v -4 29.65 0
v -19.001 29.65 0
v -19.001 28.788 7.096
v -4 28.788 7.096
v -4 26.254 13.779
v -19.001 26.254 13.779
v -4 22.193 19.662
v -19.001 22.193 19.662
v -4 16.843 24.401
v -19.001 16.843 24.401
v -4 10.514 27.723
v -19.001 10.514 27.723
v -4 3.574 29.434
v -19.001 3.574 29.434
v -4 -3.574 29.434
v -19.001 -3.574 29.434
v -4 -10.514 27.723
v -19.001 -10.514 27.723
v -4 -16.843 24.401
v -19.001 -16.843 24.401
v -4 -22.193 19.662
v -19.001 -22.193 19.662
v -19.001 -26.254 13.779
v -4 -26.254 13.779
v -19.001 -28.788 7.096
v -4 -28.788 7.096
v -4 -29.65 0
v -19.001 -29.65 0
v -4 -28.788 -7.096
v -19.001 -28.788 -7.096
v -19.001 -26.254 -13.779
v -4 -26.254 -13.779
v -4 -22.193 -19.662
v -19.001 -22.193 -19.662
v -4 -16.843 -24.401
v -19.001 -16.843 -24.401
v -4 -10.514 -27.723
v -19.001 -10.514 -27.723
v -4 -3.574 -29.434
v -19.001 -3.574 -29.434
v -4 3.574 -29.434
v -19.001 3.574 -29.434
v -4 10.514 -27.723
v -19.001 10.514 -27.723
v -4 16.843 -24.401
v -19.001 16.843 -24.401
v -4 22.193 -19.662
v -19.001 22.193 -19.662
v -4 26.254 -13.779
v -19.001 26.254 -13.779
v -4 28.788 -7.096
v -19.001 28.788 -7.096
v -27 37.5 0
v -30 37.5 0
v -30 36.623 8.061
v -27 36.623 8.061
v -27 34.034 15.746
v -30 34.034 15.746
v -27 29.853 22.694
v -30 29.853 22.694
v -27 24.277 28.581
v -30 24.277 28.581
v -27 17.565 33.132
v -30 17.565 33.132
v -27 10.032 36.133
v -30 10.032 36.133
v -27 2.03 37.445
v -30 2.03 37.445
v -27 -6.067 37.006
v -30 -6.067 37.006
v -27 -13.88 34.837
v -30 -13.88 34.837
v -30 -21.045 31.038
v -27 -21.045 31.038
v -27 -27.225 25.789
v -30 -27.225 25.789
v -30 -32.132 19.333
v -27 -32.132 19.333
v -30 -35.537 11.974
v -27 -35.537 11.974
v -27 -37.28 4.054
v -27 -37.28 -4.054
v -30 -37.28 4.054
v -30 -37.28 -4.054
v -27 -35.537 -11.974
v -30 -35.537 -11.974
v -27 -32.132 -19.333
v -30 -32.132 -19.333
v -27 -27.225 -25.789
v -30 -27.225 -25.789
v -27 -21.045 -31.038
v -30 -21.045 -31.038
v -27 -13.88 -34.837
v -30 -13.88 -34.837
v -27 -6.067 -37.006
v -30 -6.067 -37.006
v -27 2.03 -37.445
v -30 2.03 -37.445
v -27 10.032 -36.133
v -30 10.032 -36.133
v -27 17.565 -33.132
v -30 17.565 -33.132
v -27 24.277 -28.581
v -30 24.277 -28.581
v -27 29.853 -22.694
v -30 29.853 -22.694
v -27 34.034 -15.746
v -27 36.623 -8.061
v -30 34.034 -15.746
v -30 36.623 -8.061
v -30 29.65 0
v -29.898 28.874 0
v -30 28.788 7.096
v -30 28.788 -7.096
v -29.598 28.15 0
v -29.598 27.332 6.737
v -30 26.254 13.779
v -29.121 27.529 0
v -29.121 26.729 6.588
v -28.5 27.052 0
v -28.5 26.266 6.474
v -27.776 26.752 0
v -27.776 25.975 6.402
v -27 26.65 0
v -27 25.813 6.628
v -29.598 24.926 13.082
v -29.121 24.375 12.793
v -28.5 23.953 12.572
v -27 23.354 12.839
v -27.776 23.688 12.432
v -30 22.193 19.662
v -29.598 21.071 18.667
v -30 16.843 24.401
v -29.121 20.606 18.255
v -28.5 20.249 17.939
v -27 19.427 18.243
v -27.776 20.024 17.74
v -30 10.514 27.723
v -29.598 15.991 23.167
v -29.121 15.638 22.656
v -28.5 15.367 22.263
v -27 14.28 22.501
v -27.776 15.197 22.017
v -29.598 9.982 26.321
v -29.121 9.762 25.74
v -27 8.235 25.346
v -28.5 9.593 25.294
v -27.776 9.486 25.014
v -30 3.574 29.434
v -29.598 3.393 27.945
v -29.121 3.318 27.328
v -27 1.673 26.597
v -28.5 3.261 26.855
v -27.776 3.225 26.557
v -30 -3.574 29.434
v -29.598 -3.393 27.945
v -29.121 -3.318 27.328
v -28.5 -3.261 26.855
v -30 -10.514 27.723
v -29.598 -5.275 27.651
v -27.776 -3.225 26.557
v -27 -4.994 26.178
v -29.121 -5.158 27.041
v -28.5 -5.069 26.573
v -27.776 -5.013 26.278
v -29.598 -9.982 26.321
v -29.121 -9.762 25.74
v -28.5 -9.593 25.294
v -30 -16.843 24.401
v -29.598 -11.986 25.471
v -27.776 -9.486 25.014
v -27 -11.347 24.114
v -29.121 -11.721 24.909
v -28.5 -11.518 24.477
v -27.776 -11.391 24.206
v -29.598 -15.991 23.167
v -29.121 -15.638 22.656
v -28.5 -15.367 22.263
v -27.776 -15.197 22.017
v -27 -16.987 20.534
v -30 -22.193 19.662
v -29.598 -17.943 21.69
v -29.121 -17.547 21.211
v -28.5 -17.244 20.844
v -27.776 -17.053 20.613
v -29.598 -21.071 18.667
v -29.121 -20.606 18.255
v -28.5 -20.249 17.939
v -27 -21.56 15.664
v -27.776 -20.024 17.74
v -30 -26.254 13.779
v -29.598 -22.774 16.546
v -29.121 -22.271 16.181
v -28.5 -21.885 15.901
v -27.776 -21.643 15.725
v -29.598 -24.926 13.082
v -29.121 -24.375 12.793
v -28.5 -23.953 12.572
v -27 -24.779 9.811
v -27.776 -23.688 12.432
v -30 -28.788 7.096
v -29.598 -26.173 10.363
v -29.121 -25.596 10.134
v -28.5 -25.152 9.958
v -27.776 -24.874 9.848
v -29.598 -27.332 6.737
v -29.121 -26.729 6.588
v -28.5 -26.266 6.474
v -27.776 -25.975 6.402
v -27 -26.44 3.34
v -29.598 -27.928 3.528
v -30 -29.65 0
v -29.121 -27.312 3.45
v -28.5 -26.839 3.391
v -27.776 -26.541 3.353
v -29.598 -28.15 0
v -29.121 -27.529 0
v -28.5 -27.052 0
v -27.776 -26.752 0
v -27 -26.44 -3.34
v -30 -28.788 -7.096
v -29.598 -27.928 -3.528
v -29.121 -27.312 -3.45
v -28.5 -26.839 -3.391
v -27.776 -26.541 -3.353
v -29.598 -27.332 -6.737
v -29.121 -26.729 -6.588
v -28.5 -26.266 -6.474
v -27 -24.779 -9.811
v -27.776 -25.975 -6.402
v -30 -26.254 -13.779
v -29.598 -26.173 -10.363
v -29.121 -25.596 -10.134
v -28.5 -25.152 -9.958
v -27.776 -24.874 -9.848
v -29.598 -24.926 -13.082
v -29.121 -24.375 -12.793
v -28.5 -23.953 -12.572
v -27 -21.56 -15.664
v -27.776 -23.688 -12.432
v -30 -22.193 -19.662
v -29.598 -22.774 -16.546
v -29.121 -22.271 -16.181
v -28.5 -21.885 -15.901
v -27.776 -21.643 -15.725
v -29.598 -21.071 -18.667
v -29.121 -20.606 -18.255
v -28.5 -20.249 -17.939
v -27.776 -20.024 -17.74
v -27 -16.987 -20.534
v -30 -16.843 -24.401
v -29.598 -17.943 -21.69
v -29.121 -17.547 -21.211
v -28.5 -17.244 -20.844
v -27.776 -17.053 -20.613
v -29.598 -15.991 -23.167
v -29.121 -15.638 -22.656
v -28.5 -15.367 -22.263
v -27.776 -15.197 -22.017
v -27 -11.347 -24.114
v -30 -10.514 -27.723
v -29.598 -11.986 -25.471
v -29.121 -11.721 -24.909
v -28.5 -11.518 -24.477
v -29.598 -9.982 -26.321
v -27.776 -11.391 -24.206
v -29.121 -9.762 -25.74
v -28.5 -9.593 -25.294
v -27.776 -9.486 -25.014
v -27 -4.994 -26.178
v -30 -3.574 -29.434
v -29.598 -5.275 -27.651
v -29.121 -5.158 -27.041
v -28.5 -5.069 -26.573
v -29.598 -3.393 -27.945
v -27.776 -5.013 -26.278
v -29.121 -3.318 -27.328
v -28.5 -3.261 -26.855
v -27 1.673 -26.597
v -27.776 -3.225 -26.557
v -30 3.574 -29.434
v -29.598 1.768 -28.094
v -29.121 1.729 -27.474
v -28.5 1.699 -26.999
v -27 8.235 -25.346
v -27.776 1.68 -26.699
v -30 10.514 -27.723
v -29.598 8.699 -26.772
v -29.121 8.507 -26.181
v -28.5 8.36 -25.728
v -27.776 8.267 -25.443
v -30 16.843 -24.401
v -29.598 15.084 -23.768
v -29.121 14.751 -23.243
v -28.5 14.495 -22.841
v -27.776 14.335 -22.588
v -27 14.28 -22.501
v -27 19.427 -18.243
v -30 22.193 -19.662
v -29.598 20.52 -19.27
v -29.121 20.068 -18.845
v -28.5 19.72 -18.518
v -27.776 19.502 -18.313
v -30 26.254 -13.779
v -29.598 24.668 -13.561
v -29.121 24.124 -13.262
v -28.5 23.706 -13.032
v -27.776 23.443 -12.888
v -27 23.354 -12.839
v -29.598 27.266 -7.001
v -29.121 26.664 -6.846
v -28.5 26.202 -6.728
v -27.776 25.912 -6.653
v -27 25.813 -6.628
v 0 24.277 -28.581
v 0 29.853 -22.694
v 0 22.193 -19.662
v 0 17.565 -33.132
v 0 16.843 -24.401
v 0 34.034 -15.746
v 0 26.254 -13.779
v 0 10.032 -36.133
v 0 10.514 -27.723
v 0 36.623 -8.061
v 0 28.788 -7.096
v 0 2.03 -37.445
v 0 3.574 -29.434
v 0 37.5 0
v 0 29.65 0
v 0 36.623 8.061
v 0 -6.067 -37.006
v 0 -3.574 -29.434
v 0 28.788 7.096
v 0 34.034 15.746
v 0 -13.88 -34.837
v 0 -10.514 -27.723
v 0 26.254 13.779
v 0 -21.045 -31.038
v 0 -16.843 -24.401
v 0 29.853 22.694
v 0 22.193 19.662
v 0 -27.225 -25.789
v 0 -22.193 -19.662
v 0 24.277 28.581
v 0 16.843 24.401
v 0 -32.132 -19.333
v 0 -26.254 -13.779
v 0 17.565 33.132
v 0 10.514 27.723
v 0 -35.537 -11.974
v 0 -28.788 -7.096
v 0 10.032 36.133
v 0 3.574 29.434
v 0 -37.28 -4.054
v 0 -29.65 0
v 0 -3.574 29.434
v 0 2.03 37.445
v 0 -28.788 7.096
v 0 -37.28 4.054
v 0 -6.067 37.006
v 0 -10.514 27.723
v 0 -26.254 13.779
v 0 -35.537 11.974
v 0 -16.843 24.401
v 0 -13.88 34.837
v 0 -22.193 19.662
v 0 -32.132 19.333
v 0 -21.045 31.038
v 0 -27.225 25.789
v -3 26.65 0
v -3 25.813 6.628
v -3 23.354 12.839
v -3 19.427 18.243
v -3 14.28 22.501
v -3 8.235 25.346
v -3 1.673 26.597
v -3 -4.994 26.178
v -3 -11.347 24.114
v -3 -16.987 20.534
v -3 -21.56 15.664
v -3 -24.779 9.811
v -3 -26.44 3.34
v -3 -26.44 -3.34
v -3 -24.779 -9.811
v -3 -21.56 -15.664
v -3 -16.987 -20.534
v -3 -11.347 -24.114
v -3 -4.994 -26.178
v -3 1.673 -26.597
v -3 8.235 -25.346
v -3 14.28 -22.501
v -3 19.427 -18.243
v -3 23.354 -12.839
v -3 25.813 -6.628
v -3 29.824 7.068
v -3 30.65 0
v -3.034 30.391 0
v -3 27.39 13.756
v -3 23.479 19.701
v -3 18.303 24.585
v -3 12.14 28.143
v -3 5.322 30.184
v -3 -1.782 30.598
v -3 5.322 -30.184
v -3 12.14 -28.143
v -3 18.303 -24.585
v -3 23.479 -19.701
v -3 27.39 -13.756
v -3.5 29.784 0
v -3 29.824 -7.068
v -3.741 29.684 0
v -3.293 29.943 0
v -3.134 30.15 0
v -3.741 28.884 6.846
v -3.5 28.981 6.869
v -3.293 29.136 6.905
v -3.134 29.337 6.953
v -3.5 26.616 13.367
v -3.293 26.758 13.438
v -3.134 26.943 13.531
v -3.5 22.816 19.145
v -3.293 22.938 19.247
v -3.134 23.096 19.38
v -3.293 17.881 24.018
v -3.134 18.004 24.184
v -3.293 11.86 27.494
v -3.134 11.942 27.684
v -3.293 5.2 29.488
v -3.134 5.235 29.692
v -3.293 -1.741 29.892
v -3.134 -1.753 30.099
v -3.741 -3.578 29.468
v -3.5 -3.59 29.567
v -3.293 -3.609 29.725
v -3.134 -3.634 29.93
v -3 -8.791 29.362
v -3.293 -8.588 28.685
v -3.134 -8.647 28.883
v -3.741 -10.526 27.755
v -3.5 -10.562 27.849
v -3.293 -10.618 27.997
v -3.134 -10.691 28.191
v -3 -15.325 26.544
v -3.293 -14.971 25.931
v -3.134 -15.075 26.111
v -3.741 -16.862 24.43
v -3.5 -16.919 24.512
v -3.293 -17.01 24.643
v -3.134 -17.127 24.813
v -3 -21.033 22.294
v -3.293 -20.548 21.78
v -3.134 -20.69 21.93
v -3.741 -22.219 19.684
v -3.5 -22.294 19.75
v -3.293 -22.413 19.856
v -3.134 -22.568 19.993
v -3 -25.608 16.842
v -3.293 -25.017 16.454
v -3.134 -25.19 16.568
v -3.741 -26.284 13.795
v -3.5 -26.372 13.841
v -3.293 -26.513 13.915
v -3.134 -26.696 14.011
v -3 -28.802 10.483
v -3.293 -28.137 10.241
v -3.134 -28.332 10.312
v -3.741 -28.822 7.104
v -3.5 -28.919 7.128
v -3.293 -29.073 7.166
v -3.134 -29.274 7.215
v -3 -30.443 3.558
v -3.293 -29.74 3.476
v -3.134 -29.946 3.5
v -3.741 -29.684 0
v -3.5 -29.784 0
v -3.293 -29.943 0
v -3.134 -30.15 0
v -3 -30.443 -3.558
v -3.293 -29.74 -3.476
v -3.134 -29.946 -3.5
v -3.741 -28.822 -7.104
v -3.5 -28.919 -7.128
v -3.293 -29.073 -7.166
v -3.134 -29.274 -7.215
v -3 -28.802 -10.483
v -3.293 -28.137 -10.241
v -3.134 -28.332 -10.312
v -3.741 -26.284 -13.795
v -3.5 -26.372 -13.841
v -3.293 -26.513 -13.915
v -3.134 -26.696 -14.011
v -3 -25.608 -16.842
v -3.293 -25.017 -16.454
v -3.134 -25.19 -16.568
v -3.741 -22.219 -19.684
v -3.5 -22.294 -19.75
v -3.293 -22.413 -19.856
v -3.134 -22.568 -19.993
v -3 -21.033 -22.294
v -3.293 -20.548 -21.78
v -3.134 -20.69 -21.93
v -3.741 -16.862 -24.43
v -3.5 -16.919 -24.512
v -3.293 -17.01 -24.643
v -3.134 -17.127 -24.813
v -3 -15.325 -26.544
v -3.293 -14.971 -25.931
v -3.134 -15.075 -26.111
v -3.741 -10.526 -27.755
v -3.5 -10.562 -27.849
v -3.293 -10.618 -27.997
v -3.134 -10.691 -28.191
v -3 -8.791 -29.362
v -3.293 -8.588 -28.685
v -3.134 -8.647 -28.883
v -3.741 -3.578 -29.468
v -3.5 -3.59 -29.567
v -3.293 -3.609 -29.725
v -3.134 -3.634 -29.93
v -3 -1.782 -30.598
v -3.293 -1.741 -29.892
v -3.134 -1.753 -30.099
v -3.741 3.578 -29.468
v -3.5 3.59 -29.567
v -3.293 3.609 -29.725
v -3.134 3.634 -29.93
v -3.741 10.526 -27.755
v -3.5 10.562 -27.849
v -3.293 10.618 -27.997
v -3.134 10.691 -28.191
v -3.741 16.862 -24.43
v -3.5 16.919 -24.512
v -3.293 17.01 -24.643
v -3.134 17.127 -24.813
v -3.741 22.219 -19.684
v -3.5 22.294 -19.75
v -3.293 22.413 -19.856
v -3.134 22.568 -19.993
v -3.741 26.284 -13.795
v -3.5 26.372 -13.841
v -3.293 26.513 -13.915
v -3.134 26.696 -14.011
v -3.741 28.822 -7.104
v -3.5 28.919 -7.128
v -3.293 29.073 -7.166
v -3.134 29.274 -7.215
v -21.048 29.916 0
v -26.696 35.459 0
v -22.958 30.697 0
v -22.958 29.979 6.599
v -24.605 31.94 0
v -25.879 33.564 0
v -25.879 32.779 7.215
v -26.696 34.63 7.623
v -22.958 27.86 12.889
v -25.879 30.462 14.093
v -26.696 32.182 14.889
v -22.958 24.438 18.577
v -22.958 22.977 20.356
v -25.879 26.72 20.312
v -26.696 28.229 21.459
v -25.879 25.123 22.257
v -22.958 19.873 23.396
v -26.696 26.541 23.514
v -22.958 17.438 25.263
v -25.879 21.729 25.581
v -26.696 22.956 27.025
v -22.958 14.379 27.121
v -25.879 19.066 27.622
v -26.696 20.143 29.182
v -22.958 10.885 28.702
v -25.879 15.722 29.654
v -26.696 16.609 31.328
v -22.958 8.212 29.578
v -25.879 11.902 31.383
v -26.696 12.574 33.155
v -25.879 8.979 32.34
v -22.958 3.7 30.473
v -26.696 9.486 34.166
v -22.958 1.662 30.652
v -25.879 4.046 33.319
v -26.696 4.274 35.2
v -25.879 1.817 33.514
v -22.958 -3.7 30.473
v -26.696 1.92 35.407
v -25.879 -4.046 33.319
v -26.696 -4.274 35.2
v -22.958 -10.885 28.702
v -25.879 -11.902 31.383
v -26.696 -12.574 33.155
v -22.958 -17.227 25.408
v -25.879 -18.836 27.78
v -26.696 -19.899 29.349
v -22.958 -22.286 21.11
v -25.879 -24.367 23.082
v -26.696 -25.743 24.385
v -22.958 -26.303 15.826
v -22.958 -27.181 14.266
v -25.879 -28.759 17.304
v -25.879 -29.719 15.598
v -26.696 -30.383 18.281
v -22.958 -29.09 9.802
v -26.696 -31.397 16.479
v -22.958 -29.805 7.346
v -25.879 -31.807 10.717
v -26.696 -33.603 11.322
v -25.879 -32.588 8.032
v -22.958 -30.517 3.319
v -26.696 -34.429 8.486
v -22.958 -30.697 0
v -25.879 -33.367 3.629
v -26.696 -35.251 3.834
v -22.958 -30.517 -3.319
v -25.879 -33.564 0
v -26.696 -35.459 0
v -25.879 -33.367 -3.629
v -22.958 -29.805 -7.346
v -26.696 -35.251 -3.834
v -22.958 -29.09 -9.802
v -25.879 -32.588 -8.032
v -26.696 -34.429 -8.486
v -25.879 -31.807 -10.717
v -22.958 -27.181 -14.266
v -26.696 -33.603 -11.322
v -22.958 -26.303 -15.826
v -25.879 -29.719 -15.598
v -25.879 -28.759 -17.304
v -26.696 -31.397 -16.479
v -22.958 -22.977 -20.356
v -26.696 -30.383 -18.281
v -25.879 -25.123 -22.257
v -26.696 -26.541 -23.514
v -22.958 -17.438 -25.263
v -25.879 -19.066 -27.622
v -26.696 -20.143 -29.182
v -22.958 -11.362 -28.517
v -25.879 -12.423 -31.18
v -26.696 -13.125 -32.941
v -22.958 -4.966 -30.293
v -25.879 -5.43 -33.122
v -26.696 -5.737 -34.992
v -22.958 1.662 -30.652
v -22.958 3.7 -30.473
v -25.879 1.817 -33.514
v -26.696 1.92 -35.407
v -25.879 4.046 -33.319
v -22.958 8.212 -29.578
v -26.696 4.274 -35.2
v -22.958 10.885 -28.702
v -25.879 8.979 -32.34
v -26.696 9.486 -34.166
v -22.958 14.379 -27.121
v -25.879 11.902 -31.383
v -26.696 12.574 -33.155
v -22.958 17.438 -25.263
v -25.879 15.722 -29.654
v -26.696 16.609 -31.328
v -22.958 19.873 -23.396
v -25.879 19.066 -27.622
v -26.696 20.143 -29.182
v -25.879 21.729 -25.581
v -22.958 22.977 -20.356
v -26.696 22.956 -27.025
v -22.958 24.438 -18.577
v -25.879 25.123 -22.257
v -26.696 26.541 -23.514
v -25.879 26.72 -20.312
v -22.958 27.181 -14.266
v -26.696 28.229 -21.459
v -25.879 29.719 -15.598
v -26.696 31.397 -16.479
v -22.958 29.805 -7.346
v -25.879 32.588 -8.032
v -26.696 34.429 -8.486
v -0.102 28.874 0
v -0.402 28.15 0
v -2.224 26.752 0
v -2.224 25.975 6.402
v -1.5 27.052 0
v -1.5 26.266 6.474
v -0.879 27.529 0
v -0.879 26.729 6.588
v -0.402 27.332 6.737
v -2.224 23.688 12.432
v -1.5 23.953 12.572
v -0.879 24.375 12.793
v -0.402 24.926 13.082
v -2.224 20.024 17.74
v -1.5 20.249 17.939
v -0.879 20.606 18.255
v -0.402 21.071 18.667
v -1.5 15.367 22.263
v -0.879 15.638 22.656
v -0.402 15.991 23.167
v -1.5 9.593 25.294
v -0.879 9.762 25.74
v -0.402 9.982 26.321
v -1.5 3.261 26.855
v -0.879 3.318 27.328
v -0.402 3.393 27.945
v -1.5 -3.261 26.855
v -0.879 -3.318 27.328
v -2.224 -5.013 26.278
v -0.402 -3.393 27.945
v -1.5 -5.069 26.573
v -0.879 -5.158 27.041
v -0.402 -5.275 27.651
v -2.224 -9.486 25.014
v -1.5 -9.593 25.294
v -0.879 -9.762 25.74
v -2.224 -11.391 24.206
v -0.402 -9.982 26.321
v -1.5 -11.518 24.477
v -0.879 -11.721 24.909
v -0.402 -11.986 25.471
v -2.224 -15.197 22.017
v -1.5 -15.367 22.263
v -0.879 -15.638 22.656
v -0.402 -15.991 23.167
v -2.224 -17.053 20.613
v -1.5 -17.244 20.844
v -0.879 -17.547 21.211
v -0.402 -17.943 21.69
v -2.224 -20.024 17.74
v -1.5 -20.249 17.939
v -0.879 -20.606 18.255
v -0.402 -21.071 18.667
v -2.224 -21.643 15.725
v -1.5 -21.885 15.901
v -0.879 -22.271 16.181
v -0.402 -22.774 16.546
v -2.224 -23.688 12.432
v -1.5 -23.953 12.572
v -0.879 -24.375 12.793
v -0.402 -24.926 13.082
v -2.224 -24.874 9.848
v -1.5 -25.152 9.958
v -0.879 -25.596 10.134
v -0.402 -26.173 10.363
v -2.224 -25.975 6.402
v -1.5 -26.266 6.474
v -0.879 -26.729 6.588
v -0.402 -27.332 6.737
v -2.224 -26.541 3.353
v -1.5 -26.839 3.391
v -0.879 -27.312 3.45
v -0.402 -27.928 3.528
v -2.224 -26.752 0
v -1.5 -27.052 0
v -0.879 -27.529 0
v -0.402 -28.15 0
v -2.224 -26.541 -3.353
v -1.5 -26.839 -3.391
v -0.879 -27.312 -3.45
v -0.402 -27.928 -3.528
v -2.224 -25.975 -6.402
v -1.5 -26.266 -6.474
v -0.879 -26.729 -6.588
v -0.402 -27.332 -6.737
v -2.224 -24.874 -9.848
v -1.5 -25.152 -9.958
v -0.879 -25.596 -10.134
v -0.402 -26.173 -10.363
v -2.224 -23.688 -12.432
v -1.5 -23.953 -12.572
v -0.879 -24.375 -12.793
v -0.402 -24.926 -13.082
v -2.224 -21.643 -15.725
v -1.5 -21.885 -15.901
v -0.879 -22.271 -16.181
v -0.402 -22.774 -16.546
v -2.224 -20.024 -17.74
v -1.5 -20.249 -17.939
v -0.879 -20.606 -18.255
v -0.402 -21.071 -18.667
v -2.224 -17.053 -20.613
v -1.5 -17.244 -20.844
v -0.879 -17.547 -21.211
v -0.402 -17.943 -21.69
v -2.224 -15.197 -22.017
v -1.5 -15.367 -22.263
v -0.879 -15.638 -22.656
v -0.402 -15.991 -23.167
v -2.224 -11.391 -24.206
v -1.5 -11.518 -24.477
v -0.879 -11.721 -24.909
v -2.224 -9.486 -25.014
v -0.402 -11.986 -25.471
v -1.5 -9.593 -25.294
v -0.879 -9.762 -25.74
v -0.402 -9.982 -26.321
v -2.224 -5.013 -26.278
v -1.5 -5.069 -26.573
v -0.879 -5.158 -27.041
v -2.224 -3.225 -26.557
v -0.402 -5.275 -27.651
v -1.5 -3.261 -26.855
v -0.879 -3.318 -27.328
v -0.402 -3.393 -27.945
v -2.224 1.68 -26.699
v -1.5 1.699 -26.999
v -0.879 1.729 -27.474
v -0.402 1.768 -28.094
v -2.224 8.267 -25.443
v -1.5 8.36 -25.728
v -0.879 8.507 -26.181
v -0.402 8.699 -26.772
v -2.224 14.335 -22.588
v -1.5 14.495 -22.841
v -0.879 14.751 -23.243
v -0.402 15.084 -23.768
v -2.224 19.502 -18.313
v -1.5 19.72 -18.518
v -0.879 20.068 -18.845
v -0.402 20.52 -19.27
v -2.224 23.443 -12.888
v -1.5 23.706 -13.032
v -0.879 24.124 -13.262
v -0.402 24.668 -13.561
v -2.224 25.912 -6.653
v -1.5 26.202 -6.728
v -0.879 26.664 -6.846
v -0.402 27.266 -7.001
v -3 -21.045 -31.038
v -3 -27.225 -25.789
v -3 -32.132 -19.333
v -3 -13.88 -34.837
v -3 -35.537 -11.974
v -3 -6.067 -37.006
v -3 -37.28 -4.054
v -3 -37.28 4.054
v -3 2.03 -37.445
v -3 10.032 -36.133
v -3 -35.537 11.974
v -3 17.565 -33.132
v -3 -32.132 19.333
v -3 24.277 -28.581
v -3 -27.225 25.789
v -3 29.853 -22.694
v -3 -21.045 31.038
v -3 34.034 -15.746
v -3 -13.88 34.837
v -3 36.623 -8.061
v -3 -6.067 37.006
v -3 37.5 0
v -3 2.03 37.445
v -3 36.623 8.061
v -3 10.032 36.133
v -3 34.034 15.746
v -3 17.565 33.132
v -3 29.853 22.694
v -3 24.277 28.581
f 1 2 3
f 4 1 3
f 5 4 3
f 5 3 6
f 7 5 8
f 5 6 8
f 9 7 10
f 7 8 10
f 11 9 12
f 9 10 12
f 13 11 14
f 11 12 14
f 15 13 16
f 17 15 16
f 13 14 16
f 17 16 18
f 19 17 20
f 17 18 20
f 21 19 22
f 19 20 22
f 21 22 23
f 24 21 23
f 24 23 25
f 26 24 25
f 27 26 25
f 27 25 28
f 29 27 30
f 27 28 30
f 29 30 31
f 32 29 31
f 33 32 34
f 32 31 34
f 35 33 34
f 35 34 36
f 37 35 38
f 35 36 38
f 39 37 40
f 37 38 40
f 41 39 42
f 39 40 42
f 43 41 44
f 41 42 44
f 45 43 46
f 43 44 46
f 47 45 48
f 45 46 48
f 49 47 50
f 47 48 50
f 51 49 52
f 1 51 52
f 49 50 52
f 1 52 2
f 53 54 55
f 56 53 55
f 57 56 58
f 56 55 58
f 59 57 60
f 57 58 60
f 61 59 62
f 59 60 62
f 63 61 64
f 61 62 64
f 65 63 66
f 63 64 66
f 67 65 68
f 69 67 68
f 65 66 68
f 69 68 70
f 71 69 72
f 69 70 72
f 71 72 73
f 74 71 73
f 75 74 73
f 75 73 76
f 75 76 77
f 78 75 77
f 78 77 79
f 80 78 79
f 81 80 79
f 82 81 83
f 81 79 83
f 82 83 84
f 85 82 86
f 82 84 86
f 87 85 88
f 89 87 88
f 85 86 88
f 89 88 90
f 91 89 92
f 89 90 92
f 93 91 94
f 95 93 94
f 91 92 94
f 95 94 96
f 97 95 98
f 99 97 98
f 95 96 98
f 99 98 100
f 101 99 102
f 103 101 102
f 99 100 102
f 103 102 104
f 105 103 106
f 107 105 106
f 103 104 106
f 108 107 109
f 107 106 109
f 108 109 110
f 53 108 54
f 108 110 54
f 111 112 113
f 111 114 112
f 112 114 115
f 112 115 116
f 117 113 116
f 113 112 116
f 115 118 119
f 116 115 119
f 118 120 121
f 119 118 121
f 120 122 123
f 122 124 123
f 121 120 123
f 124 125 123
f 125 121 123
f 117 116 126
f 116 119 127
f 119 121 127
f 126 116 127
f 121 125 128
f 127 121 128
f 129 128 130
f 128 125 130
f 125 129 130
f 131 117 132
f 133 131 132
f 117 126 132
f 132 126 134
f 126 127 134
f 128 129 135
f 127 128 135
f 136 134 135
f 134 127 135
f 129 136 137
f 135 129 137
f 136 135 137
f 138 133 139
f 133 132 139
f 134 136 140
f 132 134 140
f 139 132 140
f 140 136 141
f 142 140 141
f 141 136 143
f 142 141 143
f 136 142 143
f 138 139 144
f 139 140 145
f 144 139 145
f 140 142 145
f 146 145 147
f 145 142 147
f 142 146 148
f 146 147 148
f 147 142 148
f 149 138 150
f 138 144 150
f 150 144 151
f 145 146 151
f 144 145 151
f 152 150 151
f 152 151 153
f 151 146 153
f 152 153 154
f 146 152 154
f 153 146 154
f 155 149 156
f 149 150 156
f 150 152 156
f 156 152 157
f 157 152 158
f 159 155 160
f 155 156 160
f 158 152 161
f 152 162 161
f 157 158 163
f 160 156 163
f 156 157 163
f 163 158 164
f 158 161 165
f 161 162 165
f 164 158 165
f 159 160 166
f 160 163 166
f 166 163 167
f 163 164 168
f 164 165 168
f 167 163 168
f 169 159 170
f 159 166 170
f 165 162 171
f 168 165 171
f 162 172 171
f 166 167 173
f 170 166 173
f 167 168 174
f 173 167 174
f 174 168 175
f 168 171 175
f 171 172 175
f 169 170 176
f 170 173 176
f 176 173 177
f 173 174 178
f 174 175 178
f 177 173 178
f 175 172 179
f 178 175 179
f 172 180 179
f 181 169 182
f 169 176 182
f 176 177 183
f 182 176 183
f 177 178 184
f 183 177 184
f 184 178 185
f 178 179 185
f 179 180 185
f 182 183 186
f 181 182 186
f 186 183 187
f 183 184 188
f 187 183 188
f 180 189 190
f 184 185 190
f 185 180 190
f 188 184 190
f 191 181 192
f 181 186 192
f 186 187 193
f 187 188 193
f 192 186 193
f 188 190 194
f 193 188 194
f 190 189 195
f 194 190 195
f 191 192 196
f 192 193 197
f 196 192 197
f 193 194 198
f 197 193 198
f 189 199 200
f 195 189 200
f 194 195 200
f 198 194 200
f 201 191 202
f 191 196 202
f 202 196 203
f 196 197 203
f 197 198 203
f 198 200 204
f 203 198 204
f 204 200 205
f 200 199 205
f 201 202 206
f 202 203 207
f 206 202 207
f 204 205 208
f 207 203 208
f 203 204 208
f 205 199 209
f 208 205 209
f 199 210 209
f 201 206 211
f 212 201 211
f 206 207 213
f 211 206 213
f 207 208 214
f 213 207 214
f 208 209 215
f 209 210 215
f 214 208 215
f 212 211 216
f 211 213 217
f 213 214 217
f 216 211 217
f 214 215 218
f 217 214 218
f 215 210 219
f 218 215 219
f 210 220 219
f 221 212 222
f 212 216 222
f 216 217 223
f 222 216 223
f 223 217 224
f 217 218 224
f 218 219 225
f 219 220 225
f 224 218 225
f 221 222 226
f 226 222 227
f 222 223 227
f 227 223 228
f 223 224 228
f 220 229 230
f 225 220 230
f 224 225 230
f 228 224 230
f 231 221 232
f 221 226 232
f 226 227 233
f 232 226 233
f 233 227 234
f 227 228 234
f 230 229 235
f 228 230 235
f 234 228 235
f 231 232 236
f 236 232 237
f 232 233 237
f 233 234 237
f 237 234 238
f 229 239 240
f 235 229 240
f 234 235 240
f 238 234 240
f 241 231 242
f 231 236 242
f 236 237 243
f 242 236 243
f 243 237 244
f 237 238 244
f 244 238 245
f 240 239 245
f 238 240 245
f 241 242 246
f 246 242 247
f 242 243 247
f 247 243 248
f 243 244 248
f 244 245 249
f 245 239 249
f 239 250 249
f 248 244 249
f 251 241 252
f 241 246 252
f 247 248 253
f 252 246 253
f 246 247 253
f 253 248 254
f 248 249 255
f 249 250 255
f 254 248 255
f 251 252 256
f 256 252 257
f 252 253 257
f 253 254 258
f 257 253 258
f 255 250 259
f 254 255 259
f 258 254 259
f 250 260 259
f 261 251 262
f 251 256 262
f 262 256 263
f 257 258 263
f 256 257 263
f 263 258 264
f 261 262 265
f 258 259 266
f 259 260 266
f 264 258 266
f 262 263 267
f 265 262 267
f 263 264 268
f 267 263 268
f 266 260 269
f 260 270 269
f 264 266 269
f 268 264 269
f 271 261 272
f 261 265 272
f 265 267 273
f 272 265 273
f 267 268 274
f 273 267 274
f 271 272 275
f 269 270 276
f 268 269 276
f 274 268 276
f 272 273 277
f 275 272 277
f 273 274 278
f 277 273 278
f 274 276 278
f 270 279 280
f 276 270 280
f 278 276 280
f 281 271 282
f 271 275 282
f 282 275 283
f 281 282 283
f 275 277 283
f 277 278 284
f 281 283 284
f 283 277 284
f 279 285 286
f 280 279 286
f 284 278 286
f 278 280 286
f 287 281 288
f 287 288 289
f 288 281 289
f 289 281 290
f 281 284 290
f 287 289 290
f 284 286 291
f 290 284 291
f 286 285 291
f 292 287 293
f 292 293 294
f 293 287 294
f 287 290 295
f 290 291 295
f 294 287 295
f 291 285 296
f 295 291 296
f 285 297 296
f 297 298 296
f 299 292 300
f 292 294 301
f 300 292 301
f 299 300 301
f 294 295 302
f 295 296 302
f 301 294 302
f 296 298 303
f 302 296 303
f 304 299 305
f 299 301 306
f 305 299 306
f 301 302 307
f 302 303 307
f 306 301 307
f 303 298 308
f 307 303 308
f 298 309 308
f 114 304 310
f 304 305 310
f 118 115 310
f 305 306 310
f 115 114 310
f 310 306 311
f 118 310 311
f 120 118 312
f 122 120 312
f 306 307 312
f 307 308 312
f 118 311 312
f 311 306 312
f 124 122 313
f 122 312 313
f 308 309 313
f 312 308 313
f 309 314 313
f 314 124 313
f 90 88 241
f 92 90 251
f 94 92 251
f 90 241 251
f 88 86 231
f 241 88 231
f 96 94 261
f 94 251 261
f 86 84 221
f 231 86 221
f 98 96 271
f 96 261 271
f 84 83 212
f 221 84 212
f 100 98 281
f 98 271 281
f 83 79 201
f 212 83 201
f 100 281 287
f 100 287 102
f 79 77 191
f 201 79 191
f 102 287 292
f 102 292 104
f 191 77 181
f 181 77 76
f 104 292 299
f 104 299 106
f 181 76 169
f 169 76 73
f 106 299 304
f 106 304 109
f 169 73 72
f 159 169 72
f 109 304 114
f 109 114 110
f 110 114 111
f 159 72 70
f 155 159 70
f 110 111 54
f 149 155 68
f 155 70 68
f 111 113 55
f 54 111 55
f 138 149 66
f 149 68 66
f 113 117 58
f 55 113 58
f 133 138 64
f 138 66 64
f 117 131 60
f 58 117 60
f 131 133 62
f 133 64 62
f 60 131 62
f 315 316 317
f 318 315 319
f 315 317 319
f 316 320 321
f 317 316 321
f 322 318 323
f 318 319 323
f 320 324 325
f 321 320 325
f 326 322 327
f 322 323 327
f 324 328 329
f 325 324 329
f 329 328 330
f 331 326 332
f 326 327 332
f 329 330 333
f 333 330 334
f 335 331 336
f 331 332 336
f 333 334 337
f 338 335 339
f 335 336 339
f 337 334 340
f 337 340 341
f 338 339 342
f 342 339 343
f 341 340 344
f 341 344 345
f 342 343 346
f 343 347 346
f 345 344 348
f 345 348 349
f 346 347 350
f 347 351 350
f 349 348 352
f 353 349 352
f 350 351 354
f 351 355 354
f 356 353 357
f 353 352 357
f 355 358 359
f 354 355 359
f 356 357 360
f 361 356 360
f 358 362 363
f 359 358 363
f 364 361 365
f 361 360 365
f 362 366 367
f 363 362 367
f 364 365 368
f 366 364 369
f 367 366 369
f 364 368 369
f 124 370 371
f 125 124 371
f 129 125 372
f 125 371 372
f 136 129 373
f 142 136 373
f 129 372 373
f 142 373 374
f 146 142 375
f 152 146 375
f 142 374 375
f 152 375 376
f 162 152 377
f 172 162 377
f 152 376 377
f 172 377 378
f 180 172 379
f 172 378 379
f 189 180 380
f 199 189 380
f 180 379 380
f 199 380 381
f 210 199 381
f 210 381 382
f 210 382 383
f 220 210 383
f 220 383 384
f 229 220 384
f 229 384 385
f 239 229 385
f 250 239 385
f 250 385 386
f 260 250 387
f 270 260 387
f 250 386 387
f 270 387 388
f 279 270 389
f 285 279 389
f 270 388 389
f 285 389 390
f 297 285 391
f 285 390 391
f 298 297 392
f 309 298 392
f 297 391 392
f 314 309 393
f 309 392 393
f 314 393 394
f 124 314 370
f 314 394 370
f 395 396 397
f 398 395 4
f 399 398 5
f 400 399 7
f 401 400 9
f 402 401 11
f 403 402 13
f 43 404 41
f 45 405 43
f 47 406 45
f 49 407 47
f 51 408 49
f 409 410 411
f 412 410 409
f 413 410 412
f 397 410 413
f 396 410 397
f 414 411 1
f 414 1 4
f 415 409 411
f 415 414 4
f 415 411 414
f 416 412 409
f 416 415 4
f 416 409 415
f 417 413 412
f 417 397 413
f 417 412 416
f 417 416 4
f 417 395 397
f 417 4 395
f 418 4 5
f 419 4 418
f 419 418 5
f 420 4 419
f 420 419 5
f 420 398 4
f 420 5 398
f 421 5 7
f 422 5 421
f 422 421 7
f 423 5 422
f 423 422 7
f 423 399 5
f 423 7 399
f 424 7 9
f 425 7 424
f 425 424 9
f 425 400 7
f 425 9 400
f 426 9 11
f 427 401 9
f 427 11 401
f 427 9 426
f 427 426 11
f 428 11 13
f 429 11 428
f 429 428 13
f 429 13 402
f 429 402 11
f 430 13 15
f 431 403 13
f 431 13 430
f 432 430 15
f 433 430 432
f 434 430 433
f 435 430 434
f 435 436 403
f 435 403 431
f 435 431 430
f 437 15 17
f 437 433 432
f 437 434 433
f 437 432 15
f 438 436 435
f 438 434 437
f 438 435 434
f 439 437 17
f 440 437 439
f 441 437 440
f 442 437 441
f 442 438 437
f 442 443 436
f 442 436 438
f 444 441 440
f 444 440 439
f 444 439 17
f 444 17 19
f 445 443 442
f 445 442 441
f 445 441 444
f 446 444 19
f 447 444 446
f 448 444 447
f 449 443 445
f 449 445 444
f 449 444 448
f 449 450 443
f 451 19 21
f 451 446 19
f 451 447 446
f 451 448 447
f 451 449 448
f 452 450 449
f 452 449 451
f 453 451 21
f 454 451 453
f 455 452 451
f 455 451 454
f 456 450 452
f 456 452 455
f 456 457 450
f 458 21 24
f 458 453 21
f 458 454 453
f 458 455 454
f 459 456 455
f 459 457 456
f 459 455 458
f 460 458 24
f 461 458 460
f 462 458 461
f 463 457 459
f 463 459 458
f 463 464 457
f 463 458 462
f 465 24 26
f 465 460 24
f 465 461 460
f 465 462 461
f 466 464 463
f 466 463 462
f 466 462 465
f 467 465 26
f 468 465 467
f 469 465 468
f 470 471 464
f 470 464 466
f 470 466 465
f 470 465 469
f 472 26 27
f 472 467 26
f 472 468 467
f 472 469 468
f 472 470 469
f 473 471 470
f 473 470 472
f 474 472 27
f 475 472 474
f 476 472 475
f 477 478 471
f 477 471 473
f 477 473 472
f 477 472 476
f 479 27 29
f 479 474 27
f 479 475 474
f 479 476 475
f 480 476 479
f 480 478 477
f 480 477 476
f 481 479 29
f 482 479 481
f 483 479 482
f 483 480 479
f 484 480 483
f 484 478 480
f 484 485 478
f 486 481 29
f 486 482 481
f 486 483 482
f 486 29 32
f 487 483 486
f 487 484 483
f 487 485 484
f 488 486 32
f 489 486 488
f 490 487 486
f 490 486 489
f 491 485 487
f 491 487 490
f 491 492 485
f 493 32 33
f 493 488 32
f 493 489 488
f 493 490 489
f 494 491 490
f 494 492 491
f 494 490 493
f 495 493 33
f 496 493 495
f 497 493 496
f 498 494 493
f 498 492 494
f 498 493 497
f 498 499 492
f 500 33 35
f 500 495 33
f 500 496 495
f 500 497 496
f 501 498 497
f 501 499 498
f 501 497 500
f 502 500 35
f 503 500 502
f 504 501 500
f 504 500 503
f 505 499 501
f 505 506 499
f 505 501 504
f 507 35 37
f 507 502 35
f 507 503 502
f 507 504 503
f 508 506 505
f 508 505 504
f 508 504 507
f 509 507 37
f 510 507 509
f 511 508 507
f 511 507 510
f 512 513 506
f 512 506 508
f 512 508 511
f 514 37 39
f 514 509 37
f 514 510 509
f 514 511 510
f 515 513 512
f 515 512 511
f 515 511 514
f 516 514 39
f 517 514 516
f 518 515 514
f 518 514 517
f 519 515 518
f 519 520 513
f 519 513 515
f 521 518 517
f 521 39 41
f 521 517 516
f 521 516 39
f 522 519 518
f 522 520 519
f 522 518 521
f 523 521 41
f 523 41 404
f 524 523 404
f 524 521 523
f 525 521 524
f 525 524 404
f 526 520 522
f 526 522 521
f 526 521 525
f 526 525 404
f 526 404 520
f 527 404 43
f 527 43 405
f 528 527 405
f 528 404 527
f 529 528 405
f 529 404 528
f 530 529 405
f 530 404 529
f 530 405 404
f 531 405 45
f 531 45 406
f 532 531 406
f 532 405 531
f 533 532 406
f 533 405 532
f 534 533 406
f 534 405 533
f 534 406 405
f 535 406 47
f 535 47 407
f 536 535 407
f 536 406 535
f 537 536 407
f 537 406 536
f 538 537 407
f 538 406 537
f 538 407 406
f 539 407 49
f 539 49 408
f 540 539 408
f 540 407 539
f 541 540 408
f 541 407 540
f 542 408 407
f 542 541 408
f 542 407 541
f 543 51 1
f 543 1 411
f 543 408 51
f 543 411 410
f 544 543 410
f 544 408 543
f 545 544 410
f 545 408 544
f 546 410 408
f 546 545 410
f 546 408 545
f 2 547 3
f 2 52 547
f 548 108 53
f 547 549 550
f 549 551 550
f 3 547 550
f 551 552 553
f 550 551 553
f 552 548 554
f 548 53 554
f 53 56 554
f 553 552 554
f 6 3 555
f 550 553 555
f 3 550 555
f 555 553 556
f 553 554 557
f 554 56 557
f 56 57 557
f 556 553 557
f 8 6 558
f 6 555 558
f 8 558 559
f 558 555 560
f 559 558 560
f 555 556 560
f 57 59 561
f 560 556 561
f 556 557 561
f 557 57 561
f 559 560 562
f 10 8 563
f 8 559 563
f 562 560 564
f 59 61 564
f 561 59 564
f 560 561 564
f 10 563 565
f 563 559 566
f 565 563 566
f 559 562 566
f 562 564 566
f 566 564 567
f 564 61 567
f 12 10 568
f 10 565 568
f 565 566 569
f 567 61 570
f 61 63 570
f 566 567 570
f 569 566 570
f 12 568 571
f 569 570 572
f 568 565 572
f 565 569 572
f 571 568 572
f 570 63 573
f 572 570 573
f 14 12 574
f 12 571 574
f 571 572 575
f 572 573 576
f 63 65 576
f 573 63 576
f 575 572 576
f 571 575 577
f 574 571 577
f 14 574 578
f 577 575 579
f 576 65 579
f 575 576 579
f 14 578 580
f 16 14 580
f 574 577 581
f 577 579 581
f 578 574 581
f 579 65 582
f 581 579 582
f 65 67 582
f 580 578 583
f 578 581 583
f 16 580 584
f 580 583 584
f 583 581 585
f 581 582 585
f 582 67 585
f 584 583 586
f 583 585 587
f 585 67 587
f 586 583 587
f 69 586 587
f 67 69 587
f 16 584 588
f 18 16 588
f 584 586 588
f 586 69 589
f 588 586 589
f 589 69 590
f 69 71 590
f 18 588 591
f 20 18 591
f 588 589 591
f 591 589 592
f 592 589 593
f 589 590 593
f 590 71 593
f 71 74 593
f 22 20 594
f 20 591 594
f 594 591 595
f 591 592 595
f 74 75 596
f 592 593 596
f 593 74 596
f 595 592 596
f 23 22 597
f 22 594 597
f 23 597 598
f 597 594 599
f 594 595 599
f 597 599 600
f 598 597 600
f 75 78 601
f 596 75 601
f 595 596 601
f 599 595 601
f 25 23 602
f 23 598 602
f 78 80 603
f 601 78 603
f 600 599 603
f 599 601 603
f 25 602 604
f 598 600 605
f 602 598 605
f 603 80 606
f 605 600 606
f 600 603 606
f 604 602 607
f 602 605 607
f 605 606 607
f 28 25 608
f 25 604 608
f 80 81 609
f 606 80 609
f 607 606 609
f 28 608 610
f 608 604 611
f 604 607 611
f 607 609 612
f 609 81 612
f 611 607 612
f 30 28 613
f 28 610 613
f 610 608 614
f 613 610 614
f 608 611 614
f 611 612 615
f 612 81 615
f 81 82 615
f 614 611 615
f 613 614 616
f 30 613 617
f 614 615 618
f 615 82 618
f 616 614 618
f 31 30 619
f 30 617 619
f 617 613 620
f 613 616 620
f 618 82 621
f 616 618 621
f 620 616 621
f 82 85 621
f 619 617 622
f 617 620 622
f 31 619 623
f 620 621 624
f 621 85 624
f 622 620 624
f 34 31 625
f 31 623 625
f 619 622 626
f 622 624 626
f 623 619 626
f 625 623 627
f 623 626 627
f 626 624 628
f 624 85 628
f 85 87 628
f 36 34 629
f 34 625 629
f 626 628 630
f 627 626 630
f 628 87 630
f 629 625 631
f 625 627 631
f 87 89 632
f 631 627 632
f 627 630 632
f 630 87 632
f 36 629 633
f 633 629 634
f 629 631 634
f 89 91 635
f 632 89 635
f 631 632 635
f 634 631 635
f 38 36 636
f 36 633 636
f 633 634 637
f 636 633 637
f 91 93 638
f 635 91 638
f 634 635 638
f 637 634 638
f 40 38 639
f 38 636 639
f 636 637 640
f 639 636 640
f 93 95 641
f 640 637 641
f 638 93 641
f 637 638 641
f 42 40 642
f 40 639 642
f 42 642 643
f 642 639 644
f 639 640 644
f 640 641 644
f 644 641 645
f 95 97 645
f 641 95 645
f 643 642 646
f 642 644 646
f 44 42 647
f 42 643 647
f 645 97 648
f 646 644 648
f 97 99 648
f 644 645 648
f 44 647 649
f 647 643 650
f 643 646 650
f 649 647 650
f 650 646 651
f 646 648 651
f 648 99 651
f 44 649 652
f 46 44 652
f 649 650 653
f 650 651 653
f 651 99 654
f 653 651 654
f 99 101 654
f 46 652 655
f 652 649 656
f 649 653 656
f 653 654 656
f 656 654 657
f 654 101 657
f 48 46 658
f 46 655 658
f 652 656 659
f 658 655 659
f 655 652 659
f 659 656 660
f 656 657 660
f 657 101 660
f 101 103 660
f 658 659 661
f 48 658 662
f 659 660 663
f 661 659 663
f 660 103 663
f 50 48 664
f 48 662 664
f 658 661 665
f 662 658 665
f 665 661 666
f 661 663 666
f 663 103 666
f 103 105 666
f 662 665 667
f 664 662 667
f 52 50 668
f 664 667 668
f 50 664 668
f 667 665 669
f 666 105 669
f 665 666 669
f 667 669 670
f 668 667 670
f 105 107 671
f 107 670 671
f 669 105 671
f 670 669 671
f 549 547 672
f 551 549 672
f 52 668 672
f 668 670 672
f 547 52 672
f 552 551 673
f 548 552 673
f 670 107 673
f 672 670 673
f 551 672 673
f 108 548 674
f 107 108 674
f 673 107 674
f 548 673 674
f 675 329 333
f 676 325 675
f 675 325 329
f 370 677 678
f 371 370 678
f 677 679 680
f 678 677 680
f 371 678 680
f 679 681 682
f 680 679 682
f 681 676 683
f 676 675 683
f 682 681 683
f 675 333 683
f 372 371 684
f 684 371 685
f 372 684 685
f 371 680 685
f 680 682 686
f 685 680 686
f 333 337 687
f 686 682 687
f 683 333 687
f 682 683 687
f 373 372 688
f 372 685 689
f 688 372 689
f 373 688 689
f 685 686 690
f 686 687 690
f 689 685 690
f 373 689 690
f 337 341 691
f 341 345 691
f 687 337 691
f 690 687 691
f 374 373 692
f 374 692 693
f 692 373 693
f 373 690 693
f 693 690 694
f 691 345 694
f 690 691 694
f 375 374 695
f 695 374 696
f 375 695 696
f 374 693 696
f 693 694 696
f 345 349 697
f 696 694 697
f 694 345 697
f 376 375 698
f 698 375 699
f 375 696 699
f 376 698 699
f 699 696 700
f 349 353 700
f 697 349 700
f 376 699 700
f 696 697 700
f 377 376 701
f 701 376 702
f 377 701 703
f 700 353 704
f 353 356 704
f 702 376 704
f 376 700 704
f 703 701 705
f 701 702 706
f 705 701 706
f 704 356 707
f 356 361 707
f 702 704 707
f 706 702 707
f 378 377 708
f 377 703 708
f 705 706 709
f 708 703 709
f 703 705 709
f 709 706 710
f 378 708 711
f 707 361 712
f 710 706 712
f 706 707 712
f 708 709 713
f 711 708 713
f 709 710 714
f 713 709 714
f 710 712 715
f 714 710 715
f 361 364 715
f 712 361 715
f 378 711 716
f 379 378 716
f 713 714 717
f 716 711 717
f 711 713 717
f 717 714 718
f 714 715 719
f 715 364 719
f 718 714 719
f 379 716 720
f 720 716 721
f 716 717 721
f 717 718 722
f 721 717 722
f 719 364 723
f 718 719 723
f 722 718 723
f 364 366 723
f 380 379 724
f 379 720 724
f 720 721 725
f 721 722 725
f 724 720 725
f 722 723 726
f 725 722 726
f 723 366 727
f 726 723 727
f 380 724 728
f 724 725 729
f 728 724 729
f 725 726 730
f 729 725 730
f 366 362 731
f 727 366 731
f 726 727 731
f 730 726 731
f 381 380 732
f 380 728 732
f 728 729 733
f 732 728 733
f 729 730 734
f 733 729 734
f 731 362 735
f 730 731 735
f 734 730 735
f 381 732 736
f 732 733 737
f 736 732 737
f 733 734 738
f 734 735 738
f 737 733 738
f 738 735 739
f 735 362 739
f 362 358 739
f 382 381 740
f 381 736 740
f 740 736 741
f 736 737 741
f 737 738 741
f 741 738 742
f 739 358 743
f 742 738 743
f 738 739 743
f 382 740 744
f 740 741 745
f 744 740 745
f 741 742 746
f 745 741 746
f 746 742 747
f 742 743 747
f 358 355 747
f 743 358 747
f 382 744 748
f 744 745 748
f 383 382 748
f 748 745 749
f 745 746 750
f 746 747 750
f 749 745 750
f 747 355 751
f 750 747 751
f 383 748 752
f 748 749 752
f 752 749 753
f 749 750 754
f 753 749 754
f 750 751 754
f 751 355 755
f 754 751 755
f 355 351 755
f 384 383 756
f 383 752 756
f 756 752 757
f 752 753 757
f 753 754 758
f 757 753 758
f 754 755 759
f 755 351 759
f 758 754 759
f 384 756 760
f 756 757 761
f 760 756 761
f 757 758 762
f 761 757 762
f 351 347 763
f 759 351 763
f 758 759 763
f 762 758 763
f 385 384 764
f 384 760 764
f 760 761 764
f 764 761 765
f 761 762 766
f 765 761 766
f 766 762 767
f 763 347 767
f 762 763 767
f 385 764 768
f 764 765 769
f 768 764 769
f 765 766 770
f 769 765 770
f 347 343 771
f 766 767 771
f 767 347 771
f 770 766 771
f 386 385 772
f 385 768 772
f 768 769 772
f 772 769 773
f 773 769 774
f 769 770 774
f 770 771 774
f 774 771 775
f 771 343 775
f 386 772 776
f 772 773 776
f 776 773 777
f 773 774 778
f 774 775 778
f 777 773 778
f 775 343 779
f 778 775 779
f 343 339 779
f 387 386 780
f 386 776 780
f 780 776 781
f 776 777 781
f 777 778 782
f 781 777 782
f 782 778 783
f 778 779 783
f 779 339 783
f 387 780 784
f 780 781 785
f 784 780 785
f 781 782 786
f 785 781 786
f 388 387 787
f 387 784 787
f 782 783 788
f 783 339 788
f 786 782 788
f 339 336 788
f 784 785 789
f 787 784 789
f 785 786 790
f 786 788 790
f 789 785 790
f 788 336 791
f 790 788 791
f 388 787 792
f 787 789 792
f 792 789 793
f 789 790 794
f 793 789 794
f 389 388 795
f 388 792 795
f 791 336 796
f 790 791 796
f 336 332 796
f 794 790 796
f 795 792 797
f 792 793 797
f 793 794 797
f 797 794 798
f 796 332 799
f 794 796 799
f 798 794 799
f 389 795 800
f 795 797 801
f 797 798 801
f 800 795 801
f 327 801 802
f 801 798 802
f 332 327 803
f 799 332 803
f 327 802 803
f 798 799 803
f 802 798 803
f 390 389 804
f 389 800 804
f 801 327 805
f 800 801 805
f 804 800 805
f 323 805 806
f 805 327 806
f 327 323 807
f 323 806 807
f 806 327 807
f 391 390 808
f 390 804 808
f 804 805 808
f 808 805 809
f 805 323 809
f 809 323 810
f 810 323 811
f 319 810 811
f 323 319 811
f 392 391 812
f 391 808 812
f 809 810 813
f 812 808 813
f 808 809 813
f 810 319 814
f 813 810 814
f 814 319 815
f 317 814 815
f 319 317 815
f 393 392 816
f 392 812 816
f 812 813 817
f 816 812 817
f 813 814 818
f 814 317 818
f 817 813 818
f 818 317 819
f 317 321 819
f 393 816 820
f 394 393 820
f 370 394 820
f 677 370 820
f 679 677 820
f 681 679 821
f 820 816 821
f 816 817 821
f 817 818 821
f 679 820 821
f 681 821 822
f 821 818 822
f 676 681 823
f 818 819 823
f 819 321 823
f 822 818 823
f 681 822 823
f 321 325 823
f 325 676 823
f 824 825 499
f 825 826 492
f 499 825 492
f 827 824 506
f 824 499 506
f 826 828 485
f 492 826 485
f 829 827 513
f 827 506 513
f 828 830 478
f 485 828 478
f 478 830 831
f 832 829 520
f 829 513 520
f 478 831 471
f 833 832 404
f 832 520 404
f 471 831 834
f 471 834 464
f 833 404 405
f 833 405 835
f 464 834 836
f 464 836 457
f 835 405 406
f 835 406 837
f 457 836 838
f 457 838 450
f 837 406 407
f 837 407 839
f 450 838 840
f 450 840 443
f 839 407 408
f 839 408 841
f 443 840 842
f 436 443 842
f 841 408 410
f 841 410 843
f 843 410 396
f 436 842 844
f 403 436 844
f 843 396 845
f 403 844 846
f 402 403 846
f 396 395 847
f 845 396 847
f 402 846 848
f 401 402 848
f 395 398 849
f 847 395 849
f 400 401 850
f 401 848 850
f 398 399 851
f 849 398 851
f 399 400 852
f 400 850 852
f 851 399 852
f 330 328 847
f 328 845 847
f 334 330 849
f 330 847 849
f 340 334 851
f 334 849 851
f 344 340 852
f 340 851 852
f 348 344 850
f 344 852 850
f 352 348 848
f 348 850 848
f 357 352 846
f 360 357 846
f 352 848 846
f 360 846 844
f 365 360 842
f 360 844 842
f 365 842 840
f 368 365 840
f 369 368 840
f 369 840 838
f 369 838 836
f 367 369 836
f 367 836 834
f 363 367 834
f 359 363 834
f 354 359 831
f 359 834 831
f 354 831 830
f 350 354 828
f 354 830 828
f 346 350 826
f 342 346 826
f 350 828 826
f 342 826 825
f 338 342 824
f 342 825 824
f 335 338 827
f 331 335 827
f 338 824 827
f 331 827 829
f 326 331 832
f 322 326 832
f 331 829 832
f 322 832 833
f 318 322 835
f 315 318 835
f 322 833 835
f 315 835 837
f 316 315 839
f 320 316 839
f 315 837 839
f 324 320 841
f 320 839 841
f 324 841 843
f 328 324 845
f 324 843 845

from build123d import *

# Parameters (mm, degrees)
F3_R = 3
F4_R = 1


# Not quite as in the source:
# - a fillet or chamfer that OpenCascade refuses, or shapes differently, is made with other operations: its cross-section is extruded or revolved along the edge and cut away or added


with BuildPart() as f1:
    # F0 (on Top) → F1 (revolve)
    with BuildSketch(Plane.XY):
        Polygon((-30, 26.65), (0, 26.65), (0, 37.5), (-3, 37.5), (-3, 29.65), (-27, 29.65), (-27, 37.5), (-30, 37.5), align=None)
    revolve(axis=Axis((5.0713585872, 0, 0), (1, 0, 0)))

    # F2: fillet of radius 8 on 1 edges, made by hand

    # F2_s1 → F2_t2 (revolve)
    with BuildSketch(Plane.XY):
        with BuildLine():
            ThreePointArc((-19.0014063736, 29.65), (-24.6049766641, 31.9403590306), (-27, 37.5))
            Line((-27, 37.5), (-27, 29.65))
            Line((-27, 29.65), (-19.0014063736, 29.65))
        make_face()
    revolve(axis=Axis((-27, 0, 0), (1, 0, 0)))

    # F3
    f3_edges = [f1.edges().sort_by_distance(p)[0] for p in [
        (0, -26.65, 0),
        (-30, -26.65, 0),
    ]]
    fillet(f3_edges, radius=F3_R)

    # F4
    f4_edges = [f1.edges().sort_by_distance(p)[0] for p in [
        (-3, -29.65, 0),
    ]]
    fillet(f4_edges, radius=F4_R)


solid = f1.part
